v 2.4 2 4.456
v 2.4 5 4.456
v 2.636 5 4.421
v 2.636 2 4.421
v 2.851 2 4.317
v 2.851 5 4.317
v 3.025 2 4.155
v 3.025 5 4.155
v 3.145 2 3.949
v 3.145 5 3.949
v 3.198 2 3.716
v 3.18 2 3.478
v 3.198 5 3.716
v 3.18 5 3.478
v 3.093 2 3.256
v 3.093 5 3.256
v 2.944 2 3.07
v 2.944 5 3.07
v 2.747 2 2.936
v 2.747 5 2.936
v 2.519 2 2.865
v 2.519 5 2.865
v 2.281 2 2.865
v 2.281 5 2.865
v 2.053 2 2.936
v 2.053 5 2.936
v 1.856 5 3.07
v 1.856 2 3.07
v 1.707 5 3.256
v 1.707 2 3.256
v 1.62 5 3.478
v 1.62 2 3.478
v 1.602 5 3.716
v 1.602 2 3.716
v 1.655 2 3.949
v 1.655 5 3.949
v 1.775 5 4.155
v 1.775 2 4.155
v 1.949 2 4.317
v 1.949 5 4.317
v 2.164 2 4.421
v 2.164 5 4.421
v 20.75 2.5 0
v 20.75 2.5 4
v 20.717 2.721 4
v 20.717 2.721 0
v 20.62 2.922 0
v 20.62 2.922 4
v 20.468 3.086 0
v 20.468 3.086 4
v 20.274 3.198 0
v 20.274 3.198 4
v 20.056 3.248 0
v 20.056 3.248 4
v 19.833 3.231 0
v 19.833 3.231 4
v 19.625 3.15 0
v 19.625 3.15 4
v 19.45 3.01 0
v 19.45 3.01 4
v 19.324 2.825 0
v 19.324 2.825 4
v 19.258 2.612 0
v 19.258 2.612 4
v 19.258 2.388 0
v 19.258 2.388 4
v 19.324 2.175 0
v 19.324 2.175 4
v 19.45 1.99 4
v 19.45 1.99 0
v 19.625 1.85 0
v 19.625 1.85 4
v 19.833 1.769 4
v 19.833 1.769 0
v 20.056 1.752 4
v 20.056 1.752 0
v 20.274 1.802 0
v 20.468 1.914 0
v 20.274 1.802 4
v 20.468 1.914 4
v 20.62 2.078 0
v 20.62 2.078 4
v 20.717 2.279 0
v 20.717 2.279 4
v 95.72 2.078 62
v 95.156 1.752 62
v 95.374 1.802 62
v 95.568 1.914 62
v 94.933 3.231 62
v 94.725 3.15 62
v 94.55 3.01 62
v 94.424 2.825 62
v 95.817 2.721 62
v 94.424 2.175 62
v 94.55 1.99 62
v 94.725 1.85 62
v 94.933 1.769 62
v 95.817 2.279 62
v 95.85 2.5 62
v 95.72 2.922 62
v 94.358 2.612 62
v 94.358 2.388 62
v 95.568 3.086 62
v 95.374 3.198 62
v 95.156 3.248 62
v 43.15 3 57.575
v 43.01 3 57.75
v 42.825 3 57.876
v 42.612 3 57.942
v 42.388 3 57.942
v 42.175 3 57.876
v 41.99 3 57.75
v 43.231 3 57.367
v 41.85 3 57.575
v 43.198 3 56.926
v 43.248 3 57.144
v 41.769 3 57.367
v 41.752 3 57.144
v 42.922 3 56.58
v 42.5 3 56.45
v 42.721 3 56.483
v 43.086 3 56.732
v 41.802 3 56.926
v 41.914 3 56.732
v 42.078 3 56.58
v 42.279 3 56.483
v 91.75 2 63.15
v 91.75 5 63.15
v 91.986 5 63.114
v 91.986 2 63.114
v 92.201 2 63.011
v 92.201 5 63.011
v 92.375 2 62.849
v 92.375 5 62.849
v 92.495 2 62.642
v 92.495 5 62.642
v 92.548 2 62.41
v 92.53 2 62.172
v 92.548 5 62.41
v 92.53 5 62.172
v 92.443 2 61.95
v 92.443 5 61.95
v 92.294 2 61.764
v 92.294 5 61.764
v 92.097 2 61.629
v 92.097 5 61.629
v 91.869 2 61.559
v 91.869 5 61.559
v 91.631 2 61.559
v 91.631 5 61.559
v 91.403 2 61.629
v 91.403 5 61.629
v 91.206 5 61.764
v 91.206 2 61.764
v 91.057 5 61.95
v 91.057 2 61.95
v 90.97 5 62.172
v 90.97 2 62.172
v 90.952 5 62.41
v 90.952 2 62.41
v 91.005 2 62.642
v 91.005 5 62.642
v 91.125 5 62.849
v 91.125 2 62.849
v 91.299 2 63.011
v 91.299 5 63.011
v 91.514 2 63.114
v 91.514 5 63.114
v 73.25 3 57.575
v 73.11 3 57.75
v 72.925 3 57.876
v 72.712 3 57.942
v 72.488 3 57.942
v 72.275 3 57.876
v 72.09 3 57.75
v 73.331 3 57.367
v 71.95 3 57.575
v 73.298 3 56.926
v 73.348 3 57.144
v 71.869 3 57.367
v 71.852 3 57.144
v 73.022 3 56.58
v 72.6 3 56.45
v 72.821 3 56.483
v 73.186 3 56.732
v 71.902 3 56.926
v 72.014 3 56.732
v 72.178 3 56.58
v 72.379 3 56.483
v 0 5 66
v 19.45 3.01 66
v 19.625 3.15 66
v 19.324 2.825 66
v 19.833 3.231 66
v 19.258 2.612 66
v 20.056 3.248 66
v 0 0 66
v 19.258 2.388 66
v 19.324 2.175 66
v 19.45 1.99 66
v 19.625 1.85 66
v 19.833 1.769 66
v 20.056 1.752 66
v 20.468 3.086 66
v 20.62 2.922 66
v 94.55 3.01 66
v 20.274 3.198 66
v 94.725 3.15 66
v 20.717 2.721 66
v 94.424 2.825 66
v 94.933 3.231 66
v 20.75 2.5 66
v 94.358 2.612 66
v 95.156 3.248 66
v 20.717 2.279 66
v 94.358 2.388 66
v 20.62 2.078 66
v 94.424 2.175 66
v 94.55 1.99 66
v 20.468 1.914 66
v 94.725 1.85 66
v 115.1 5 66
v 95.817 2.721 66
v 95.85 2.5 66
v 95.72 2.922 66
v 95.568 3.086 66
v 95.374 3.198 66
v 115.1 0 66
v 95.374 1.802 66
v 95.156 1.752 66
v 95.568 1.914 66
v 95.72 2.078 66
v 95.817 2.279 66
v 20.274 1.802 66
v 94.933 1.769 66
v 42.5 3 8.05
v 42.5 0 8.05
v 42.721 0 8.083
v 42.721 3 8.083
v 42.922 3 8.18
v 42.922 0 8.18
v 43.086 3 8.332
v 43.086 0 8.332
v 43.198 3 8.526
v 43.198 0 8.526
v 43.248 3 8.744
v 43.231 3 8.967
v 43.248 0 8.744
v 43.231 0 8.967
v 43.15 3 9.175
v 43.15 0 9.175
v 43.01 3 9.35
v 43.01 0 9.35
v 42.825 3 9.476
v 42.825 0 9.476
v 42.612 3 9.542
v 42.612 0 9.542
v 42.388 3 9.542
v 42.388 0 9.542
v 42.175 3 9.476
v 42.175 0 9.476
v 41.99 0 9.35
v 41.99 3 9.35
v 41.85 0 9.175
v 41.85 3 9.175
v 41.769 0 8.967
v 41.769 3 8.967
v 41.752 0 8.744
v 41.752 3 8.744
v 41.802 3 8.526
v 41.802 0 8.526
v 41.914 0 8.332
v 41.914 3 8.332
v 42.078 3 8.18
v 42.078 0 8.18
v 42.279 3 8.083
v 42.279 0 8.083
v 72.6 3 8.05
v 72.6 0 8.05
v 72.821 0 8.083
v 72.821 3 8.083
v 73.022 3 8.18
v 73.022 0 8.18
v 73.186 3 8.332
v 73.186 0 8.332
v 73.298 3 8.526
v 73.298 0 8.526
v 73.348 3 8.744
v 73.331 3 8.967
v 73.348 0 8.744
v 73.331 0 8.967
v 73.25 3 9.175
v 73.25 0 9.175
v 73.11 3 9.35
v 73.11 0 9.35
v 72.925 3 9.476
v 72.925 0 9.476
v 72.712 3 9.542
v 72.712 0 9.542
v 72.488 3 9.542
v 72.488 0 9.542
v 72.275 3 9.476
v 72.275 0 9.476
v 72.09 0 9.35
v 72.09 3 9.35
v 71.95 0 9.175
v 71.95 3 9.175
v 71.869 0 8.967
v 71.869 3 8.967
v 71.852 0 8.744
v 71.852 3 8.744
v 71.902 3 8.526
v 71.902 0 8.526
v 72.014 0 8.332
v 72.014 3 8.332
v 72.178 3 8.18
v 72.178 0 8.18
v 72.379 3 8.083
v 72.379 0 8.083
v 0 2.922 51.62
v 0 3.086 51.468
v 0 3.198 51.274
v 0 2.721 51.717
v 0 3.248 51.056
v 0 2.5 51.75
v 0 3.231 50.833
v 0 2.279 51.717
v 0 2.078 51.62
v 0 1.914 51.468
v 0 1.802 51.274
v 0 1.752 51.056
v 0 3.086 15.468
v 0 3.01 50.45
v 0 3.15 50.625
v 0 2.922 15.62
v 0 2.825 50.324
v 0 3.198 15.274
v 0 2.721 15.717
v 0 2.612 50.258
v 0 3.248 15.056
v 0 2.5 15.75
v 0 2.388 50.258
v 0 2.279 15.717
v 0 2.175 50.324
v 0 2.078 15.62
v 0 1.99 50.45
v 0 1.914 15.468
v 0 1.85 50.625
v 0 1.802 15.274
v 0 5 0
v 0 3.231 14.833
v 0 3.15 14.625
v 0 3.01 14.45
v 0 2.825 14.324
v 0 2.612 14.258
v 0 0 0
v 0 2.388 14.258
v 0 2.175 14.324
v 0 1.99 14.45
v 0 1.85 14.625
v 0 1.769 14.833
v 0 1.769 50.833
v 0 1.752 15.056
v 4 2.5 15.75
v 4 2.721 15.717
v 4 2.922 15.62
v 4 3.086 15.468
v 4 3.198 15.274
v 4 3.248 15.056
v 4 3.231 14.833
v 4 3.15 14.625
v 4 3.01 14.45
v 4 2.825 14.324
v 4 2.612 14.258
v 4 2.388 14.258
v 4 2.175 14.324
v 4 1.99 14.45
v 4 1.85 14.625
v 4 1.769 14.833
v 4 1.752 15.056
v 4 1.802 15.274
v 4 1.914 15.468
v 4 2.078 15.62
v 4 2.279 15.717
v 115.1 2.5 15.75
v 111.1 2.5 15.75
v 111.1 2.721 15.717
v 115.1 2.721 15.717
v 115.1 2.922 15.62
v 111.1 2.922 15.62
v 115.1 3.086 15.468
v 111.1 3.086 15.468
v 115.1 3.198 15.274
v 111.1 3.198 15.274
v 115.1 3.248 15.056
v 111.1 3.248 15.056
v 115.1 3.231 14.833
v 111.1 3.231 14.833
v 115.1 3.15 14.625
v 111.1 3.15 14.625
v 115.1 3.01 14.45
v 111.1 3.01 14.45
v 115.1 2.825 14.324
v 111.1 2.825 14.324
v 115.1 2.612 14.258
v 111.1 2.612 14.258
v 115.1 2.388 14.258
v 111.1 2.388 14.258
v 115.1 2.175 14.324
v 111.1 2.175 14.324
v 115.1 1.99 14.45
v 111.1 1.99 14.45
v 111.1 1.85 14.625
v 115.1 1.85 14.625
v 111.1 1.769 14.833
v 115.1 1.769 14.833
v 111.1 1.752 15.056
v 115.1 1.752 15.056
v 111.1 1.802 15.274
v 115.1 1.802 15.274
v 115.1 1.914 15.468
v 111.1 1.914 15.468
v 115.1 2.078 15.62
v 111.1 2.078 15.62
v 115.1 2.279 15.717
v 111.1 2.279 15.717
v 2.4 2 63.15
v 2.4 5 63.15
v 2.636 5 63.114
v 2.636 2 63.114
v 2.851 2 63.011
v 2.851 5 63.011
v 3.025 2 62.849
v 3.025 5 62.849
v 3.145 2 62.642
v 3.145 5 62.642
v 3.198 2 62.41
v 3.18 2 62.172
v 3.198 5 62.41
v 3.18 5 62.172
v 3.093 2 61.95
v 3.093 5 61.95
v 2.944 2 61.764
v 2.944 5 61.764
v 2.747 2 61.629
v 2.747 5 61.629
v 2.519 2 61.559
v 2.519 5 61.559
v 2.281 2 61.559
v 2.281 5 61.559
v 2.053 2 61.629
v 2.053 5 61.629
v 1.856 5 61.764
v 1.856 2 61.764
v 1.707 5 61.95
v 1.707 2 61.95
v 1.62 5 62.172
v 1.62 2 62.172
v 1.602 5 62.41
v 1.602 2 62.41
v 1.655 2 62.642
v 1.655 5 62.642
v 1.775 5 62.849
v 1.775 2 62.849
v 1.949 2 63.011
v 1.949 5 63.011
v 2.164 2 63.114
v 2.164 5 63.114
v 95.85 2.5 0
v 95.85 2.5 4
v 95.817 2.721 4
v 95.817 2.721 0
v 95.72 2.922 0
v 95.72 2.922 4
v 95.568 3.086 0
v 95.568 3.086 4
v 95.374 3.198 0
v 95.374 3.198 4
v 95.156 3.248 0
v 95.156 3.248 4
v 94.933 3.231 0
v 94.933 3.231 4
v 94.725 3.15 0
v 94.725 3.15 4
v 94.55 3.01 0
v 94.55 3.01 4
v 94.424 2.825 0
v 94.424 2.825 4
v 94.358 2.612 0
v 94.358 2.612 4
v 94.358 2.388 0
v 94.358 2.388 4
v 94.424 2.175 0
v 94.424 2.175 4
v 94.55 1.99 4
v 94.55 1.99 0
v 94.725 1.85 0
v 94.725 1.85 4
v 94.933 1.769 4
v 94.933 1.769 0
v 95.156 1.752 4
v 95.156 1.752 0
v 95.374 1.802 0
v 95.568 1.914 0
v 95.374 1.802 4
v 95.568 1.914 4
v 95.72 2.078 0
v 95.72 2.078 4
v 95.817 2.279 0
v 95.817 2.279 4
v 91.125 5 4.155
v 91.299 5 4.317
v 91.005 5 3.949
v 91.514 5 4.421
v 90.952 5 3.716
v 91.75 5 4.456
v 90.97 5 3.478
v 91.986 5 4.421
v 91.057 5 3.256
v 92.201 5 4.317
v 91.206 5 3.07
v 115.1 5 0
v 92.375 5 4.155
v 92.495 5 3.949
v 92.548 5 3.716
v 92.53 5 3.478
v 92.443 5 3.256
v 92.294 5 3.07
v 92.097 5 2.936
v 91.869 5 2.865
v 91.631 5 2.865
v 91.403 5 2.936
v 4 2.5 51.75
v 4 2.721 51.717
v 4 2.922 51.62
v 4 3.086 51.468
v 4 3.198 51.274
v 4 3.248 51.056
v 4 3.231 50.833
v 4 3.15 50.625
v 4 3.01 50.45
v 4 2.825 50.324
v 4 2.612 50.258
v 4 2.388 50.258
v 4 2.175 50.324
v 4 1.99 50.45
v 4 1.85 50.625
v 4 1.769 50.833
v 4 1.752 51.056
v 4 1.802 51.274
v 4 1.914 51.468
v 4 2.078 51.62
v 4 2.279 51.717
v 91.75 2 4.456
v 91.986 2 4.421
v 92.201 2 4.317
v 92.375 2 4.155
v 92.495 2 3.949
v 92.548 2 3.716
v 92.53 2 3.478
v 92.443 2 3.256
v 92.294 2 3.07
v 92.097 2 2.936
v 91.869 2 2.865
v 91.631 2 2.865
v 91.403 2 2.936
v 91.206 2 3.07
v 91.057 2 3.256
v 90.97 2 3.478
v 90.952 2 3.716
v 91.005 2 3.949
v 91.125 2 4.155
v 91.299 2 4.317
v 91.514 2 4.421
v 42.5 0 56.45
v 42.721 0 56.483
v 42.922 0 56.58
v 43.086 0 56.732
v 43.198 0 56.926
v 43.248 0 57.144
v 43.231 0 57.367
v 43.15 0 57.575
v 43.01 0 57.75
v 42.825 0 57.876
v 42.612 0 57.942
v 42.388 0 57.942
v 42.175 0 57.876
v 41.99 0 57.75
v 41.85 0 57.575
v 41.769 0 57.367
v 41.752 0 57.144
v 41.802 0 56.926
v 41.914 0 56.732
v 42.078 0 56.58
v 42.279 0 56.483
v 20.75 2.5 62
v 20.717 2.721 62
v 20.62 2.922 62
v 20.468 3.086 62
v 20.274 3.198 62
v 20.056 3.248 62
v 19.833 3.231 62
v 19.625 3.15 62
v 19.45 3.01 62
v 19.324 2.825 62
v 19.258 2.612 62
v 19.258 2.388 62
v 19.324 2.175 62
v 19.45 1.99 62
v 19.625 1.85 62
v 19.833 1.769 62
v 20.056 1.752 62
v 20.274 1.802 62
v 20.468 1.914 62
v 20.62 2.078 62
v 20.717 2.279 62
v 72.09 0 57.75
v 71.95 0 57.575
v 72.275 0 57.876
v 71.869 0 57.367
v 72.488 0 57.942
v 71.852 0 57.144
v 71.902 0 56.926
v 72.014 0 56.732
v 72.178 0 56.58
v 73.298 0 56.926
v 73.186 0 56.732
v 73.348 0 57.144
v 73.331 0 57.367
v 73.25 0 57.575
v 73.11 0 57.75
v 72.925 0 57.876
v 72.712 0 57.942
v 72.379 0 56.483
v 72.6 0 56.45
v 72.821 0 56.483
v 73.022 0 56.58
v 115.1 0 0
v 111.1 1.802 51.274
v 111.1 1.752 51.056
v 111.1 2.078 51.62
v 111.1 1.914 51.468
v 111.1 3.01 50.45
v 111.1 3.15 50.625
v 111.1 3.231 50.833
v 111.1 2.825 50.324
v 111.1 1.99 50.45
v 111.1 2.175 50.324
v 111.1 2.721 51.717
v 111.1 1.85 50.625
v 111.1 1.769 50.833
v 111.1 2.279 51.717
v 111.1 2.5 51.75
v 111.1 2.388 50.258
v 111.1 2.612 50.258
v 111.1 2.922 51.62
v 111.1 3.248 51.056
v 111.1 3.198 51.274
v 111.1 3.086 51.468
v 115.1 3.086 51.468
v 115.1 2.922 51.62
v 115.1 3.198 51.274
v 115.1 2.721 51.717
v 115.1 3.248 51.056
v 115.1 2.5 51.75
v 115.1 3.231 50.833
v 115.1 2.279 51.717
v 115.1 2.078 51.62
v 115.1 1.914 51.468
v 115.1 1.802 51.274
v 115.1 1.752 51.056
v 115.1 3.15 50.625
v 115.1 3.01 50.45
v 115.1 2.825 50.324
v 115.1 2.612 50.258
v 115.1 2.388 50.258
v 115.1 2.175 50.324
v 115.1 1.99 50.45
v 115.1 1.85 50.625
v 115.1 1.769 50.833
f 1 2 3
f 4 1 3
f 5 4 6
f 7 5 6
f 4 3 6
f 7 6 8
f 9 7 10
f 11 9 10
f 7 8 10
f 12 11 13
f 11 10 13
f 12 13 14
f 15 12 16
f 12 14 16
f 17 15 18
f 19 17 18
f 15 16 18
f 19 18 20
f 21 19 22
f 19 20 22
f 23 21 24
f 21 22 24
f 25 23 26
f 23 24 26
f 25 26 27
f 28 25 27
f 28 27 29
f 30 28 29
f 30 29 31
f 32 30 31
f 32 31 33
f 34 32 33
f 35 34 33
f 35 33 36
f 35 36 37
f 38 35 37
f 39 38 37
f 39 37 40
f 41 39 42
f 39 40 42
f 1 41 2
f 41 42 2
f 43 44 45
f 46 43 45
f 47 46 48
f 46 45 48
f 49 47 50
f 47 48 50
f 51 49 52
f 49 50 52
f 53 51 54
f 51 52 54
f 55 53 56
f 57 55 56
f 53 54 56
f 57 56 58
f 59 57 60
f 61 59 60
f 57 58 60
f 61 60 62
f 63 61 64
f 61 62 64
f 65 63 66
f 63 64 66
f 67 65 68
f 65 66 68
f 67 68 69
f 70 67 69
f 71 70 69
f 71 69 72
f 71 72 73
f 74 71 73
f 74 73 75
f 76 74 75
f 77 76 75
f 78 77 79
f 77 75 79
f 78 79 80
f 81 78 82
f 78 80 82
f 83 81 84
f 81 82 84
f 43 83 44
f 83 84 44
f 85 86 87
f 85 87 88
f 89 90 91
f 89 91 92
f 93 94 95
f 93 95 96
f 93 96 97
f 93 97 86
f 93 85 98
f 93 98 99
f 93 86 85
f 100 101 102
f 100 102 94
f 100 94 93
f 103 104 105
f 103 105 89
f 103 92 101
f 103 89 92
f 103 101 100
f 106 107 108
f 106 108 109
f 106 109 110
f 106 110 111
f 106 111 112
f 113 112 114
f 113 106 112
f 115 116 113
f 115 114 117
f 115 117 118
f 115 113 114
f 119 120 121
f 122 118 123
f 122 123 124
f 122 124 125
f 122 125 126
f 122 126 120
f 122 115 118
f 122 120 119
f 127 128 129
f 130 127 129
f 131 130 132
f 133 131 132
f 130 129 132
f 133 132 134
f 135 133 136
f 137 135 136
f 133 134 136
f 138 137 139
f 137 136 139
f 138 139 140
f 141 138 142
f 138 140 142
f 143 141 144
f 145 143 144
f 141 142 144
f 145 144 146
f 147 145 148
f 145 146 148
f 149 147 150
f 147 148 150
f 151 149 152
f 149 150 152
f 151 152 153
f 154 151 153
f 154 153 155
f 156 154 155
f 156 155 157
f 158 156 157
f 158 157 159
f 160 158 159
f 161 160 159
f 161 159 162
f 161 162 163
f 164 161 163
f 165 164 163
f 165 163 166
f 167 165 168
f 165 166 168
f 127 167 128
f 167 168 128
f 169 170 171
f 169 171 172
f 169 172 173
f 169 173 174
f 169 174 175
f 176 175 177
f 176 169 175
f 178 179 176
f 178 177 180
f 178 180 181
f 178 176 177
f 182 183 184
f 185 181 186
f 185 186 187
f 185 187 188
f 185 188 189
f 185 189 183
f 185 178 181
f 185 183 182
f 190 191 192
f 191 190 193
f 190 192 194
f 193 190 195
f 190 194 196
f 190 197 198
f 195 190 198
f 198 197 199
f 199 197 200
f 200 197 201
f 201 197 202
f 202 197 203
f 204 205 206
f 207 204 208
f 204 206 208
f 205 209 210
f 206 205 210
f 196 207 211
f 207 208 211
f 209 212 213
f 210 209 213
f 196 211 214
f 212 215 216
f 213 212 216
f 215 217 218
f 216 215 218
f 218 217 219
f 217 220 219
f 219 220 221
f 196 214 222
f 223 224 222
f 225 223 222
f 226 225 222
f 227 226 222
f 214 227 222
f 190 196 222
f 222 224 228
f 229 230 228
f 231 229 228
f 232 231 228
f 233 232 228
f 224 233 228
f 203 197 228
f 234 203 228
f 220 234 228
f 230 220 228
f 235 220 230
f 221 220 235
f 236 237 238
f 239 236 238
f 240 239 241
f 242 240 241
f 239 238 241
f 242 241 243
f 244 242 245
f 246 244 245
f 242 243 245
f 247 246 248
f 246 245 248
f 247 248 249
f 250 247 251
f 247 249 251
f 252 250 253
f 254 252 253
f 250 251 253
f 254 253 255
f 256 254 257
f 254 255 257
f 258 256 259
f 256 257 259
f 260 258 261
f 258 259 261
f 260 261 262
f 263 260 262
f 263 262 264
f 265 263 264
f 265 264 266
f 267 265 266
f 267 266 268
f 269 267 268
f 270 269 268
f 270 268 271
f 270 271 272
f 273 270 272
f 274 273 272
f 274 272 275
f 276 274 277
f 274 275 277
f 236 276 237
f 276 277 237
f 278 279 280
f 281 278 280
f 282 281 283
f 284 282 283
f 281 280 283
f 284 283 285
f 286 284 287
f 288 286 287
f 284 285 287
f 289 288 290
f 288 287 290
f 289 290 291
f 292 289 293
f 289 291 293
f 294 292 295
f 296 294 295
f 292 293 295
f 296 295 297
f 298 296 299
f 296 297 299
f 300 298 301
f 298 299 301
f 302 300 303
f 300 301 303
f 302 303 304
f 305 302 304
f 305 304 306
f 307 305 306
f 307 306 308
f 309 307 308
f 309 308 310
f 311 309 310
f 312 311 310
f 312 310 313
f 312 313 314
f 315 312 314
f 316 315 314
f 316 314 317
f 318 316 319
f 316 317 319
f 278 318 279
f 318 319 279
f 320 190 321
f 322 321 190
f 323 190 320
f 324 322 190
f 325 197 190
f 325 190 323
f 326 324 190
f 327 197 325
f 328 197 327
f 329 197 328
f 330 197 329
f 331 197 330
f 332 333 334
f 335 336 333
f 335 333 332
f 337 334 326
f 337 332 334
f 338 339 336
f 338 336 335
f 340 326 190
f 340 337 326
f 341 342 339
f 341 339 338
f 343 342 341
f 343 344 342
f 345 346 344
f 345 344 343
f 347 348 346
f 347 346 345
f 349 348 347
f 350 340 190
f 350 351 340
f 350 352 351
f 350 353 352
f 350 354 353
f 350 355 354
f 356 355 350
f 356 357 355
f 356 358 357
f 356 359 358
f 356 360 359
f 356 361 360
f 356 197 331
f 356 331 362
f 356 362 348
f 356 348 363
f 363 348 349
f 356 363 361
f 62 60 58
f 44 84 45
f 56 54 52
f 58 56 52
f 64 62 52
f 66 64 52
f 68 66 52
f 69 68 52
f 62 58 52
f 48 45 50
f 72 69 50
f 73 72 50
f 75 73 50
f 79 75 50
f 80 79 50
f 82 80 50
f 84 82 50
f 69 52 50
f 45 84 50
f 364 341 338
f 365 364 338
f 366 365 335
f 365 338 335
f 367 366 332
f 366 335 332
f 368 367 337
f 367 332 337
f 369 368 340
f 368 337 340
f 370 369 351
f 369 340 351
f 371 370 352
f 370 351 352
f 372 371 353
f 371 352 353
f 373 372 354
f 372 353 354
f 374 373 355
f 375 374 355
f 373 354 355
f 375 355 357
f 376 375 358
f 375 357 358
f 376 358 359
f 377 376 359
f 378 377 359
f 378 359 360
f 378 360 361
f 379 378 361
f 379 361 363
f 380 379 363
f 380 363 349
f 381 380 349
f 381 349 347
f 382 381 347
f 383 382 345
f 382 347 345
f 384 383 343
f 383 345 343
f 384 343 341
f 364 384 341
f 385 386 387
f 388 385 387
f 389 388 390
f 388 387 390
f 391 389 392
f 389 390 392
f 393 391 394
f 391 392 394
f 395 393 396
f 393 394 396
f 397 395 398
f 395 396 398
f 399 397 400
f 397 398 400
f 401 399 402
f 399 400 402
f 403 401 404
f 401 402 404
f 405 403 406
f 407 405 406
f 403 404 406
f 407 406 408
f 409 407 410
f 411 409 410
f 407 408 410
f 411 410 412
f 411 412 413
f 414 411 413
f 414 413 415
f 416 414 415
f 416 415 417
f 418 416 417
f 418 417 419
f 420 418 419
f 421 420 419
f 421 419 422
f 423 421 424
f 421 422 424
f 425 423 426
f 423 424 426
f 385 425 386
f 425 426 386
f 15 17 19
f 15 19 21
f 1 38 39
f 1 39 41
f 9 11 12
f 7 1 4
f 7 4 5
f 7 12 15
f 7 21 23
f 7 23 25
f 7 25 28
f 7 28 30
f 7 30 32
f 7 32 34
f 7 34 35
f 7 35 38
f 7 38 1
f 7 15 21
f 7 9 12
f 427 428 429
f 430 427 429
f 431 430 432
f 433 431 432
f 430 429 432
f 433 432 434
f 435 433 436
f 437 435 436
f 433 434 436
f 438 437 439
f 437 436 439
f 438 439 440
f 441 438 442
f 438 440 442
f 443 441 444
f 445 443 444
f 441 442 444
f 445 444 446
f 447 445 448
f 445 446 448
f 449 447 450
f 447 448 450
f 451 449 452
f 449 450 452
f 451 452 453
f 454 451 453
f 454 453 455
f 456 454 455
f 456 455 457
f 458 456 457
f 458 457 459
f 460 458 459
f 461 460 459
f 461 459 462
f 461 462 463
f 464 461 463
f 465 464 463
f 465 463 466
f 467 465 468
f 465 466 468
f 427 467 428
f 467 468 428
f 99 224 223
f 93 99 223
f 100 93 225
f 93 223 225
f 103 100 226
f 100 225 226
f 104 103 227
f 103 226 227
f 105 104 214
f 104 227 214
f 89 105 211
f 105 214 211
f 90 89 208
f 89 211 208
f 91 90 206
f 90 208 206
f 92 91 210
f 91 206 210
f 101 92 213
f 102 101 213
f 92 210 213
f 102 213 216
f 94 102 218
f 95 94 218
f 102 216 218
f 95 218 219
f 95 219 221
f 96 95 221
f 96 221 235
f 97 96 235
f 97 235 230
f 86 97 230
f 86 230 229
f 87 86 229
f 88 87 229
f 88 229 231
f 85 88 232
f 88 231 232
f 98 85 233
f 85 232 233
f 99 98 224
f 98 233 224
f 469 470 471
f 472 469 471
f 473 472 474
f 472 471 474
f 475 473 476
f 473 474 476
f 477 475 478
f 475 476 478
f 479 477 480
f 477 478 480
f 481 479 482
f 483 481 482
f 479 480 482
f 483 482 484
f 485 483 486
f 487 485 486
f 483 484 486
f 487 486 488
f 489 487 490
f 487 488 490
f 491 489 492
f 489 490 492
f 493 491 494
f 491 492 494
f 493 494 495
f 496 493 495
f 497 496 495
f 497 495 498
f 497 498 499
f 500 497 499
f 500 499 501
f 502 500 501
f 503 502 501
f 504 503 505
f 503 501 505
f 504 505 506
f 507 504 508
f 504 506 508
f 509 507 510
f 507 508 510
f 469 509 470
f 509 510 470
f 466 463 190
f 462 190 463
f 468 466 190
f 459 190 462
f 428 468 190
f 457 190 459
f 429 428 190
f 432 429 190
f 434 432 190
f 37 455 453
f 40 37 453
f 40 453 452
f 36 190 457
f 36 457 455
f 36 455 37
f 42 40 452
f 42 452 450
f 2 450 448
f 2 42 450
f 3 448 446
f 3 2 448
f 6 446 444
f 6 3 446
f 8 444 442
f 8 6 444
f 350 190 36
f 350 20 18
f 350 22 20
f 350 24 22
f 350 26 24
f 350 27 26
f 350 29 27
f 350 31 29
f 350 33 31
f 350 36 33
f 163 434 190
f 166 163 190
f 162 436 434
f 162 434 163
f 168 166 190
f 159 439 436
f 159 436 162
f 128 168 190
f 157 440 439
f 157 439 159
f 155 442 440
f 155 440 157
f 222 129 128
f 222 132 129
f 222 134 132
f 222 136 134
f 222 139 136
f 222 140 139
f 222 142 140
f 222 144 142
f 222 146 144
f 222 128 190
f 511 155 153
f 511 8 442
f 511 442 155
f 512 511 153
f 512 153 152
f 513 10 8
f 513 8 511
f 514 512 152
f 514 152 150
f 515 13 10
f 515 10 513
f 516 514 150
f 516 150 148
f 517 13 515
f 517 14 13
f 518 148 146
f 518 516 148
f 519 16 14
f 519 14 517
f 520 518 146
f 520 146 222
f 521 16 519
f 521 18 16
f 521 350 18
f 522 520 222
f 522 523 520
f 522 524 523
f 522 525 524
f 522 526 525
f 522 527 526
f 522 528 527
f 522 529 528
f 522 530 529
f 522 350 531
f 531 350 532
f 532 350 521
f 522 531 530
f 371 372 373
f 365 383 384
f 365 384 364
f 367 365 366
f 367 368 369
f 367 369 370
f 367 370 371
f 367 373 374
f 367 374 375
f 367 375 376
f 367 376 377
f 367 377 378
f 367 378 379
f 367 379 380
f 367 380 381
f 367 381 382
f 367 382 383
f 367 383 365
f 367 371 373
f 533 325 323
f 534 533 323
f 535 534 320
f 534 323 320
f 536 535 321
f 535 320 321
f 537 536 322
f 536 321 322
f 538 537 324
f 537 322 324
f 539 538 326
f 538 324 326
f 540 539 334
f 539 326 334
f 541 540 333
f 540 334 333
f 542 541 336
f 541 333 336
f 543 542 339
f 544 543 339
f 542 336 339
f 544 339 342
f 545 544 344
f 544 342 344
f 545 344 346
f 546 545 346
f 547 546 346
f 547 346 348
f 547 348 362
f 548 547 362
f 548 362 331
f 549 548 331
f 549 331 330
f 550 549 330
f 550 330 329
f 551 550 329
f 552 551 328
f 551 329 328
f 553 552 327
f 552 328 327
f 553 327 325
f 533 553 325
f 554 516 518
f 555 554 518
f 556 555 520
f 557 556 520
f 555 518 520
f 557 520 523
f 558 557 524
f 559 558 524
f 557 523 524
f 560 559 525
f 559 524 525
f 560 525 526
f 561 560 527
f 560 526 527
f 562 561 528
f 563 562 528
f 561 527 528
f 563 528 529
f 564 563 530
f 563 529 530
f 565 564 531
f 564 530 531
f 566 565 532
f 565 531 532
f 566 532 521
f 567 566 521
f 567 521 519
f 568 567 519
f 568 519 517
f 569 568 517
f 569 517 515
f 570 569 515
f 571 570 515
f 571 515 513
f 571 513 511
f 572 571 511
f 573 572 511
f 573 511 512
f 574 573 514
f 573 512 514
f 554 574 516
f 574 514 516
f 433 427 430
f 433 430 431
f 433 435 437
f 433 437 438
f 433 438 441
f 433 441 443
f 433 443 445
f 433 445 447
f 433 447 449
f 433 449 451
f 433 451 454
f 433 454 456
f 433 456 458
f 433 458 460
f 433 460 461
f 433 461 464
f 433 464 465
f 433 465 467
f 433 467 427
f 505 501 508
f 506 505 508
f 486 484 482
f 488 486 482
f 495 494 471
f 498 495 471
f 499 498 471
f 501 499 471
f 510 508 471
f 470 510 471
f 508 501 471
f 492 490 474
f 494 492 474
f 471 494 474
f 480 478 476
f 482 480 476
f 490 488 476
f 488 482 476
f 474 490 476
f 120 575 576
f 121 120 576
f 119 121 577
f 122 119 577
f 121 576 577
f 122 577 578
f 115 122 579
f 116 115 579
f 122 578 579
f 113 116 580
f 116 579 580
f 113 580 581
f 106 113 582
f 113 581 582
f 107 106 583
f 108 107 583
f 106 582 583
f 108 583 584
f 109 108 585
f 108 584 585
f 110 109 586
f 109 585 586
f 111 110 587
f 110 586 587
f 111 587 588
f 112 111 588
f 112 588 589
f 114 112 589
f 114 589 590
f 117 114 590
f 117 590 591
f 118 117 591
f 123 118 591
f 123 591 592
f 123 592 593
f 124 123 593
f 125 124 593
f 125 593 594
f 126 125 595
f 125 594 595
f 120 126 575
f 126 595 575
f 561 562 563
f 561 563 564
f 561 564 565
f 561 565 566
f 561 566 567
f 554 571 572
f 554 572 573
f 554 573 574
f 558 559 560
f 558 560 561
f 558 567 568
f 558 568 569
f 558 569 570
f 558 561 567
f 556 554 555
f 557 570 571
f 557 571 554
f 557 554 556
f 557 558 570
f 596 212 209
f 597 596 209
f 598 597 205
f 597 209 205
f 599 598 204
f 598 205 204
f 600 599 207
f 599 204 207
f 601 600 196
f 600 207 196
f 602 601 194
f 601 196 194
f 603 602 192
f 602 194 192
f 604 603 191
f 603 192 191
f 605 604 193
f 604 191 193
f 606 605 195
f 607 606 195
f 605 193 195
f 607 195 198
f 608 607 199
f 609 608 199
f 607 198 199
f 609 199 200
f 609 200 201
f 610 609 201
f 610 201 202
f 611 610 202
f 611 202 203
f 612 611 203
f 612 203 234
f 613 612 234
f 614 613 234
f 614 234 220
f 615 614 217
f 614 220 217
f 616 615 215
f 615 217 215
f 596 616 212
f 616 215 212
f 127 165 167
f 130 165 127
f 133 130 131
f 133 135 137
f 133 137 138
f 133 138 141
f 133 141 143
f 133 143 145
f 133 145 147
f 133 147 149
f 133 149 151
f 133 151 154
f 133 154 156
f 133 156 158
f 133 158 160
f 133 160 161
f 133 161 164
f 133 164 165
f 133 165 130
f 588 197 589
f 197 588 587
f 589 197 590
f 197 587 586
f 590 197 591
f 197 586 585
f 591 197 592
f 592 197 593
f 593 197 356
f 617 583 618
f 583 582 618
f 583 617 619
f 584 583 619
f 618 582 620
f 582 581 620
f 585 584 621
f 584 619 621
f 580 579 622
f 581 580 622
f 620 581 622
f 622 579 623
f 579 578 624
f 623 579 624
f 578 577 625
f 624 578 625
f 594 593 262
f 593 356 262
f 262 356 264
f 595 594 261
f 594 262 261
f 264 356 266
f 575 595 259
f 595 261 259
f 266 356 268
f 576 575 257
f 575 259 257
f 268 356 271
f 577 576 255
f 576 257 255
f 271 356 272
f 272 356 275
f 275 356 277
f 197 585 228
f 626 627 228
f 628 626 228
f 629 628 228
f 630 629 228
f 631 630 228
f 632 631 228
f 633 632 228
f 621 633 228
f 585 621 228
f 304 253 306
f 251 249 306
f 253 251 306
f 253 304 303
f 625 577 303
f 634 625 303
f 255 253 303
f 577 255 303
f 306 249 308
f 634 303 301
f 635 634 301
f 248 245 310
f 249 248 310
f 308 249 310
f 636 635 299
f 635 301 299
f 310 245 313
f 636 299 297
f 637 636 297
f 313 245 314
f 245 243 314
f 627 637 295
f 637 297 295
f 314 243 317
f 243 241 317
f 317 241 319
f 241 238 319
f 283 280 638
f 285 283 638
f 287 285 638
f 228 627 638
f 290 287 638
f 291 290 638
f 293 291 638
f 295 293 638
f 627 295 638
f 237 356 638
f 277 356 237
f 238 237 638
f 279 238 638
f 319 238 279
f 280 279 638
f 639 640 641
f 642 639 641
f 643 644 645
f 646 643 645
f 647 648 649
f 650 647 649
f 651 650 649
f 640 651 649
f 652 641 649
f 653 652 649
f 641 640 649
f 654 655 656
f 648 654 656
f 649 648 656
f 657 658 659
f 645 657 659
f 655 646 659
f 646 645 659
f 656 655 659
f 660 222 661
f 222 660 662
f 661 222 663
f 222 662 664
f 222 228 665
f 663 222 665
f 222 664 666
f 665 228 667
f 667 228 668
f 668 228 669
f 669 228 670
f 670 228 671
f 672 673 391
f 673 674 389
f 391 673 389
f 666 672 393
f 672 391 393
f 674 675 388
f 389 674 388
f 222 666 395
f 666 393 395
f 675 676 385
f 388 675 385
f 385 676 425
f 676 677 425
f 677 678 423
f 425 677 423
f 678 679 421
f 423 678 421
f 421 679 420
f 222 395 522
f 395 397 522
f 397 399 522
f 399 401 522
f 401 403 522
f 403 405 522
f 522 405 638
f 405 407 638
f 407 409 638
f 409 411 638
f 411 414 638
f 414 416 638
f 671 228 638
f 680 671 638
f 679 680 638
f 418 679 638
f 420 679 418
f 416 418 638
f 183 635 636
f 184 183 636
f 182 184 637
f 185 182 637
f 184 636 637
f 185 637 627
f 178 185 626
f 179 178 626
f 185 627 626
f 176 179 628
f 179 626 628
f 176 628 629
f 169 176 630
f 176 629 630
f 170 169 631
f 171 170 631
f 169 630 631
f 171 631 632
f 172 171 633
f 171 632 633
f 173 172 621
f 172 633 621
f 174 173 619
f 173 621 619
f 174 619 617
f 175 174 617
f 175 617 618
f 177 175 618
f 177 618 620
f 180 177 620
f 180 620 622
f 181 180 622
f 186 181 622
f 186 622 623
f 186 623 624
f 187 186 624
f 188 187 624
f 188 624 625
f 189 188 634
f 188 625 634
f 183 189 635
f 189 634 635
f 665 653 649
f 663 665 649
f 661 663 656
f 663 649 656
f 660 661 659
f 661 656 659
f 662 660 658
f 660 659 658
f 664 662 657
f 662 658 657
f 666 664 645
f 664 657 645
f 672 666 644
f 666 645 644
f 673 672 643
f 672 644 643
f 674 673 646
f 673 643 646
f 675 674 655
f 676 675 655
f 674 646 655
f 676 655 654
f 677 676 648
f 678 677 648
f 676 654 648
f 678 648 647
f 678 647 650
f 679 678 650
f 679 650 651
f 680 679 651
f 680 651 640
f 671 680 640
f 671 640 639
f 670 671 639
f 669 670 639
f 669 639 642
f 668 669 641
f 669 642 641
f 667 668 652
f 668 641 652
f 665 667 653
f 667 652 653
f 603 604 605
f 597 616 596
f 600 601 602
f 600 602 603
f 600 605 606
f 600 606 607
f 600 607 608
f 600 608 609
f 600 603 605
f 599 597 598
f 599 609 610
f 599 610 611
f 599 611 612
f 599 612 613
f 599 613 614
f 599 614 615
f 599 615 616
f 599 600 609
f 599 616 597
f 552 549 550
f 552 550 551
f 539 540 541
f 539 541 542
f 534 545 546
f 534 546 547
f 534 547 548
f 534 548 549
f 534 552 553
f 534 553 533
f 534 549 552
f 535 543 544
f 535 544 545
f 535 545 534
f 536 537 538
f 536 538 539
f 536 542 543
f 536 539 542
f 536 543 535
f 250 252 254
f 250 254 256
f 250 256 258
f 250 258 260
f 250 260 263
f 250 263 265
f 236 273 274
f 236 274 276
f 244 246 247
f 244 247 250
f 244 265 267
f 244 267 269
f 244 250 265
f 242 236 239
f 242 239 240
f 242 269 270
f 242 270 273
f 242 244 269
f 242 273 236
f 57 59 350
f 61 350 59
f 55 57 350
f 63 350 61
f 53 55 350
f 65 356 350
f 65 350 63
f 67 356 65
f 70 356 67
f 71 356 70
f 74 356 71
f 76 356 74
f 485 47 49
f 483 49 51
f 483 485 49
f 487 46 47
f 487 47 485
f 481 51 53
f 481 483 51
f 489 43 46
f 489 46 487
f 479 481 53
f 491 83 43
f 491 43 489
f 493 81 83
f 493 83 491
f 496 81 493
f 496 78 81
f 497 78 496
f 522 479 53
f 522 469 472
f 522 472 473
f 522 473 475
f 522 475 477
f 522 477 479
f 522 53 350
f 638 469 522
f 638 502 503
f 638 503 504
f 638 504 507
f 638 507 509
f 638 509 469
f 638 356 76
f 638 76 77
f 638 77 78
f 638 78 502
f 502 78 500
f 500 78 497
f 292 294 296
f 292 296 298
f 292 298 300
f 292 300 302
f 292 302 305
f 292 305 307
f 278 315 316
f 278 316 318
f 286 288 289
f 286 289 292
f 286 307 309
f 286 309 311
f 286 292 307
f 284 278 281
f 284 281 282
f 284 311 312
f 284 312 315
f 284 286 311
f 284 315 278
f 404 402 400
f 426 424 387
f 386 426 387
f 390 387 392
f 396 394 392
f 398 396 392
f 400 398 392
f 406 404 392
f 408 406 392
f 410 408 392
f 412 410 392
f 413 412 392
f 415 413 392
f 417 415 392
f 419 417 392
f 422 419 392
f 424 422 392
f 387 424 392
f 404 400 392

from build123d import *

# Parameters (mm, degrees)
SKETCH_1_W          = 115.1
SKETCH_1_H          = 66
EXTRUDE_1_DEPTH     = 5
SKETCH_2_R          = 0.8
CUT_EXTRUDE_1_DEPTH = 3
SKETCH_3_R          = 0.75
CUT_EXTRUDE_2_DEPTH = 4
CUT_EXTRUDE_START   = -111.1
SKETCH_3_3_R        = 0.75
CUT_EXTRUDE_3_DEPTH = 4
SKETCH_4_R          = 0.75
CUT_EXTRUDE_4_DEPTH = 4
CUT_EXTRUDE_START_2 = -62
SKETCH_4_2_R        = 0.75
CUT_EXTRUDE_5_DEPTH = 4
SKETCH_5_R          = 0.75
CUT_EXTRUDE_6_DEPTH = 3


with BuildPart() as part:
    # 草图1 → 凸台-拉伸1 (new body)
    with BuildSketch(Plane(origin=(0, 0, 0), x_dir=(1, 0, 0), z_dir=(0, 1, 0))):
        with Locations((57.55, -33)):
            Rectangle(SKETCH_1_W, SKETCH_1_H)
    extrude(amount=EXTRUDE_1_DEPTH)

    # 草图2 → 切除-拉伸1 (cut)
    with BuildSketch(Plane(origin=(0, 5, 0), x_dir=(1, 0, 0), z_dir=(0, 1, 0))):
        with Locations(Location((2.4, -62.349996231, 0), (0, 0, 270))):
            Circle(SKETCH_2_R)
        with Locations(Location((2.4, -3.656474817, 0), (0, 0, 270))):
            Circle(SKETCH_2_R)
        with Locations(Location((91.75, -62.349996231, 0), (0, 0, 270))):
            Circle(SKETCH_2_R)
        with Locations(Location((91.75, -3.656474817, 0), (0, 0, 270))):
            Circle(SKETCH_2_R)
    extrude(amount=-CUT_EXTRUDE_1_DEPTH, mode=Mode.SUBTRACT)

    # 草图3 → 切除-拉伸2 (cut)
    with BuildSketch(Plane.ZY):
        with Locations((51, 2.5)):
            Circle(SKETCH_3_R)
        with Locations((15, 2.5)):
            Circle(SKETCH_3_R)
    extrude(amount=-CUT_EXTRUDE_2_DEPTH, mode=Mode.SUBTRACT)

    # 草图3<3> → 切除-拉伸3 (cut)
    with BuildSketch(Plane.ZY.offset(CUT_EXTRUDE_START)):
        with Locations((51, 2.5)):
            Circle(SKETCH_3_3_R)
        with Locations((15, 2.5)):
            Circle(SKETCH_3_3_R)
    extrude(amount=-CUT_EXTRUDE_3_DEPTH, mode=Mode.SUBTRACT)

    # 草图4 → 切除-拉伸4 (cut)
    with BuildSketch(Plane.XY.offset(66)):
        with Locations((20, 2.5)):
            Circle(SKETCH_4_R)
        with Locations((95.1, 2.5)):
            Circle(SKETCH_4_R)
    extrude(amount=-CUT_EXTRUDE_4_DEPTH, mode=Mode.SUBTRACT)

    # 草图4<2> → 切除-拉伸5 (cut)
    with BuildSketch(Plane.XY.offset(66).offset(CUT_EXTRUDE_START_2)):
        with Locations((20, 2.5)):
            Circle(SKETCH_4_2_R)
        with Locations((95.1, 2.5)):
            Circle(SKETCH_4_2_R)
    extrude(amount=-CUT_EXTRUDE_5_DEPTH, mode=Mode.SUBTRACT)

    # 草图5 → 切除-拉伸6 (cut)
    with BuildSketch(Plane.XZ):
        with Locations(Location((72.6, 8.8, 0), (0, 0, 270))):
            Circle(SKETCH_5_R)
        with Locations(Location((42.5, 8.8, 0), (0, 0, 270))):
            Circle(SKETCH_5_R)
        with Locations(Location((72.6, 57.2, 0), (0, 0, 270))):
            Circle(SKETCH_5_R)
        with Locations(Location((42.5, 57.2, 0), (0, 0, 270))):
            Circle(SKETCH_5_R)
    extrude(amount=-CUT_EXTRUDE_6_DEPTH, mode=Mode.SUBTRACT)


solid = part.part
